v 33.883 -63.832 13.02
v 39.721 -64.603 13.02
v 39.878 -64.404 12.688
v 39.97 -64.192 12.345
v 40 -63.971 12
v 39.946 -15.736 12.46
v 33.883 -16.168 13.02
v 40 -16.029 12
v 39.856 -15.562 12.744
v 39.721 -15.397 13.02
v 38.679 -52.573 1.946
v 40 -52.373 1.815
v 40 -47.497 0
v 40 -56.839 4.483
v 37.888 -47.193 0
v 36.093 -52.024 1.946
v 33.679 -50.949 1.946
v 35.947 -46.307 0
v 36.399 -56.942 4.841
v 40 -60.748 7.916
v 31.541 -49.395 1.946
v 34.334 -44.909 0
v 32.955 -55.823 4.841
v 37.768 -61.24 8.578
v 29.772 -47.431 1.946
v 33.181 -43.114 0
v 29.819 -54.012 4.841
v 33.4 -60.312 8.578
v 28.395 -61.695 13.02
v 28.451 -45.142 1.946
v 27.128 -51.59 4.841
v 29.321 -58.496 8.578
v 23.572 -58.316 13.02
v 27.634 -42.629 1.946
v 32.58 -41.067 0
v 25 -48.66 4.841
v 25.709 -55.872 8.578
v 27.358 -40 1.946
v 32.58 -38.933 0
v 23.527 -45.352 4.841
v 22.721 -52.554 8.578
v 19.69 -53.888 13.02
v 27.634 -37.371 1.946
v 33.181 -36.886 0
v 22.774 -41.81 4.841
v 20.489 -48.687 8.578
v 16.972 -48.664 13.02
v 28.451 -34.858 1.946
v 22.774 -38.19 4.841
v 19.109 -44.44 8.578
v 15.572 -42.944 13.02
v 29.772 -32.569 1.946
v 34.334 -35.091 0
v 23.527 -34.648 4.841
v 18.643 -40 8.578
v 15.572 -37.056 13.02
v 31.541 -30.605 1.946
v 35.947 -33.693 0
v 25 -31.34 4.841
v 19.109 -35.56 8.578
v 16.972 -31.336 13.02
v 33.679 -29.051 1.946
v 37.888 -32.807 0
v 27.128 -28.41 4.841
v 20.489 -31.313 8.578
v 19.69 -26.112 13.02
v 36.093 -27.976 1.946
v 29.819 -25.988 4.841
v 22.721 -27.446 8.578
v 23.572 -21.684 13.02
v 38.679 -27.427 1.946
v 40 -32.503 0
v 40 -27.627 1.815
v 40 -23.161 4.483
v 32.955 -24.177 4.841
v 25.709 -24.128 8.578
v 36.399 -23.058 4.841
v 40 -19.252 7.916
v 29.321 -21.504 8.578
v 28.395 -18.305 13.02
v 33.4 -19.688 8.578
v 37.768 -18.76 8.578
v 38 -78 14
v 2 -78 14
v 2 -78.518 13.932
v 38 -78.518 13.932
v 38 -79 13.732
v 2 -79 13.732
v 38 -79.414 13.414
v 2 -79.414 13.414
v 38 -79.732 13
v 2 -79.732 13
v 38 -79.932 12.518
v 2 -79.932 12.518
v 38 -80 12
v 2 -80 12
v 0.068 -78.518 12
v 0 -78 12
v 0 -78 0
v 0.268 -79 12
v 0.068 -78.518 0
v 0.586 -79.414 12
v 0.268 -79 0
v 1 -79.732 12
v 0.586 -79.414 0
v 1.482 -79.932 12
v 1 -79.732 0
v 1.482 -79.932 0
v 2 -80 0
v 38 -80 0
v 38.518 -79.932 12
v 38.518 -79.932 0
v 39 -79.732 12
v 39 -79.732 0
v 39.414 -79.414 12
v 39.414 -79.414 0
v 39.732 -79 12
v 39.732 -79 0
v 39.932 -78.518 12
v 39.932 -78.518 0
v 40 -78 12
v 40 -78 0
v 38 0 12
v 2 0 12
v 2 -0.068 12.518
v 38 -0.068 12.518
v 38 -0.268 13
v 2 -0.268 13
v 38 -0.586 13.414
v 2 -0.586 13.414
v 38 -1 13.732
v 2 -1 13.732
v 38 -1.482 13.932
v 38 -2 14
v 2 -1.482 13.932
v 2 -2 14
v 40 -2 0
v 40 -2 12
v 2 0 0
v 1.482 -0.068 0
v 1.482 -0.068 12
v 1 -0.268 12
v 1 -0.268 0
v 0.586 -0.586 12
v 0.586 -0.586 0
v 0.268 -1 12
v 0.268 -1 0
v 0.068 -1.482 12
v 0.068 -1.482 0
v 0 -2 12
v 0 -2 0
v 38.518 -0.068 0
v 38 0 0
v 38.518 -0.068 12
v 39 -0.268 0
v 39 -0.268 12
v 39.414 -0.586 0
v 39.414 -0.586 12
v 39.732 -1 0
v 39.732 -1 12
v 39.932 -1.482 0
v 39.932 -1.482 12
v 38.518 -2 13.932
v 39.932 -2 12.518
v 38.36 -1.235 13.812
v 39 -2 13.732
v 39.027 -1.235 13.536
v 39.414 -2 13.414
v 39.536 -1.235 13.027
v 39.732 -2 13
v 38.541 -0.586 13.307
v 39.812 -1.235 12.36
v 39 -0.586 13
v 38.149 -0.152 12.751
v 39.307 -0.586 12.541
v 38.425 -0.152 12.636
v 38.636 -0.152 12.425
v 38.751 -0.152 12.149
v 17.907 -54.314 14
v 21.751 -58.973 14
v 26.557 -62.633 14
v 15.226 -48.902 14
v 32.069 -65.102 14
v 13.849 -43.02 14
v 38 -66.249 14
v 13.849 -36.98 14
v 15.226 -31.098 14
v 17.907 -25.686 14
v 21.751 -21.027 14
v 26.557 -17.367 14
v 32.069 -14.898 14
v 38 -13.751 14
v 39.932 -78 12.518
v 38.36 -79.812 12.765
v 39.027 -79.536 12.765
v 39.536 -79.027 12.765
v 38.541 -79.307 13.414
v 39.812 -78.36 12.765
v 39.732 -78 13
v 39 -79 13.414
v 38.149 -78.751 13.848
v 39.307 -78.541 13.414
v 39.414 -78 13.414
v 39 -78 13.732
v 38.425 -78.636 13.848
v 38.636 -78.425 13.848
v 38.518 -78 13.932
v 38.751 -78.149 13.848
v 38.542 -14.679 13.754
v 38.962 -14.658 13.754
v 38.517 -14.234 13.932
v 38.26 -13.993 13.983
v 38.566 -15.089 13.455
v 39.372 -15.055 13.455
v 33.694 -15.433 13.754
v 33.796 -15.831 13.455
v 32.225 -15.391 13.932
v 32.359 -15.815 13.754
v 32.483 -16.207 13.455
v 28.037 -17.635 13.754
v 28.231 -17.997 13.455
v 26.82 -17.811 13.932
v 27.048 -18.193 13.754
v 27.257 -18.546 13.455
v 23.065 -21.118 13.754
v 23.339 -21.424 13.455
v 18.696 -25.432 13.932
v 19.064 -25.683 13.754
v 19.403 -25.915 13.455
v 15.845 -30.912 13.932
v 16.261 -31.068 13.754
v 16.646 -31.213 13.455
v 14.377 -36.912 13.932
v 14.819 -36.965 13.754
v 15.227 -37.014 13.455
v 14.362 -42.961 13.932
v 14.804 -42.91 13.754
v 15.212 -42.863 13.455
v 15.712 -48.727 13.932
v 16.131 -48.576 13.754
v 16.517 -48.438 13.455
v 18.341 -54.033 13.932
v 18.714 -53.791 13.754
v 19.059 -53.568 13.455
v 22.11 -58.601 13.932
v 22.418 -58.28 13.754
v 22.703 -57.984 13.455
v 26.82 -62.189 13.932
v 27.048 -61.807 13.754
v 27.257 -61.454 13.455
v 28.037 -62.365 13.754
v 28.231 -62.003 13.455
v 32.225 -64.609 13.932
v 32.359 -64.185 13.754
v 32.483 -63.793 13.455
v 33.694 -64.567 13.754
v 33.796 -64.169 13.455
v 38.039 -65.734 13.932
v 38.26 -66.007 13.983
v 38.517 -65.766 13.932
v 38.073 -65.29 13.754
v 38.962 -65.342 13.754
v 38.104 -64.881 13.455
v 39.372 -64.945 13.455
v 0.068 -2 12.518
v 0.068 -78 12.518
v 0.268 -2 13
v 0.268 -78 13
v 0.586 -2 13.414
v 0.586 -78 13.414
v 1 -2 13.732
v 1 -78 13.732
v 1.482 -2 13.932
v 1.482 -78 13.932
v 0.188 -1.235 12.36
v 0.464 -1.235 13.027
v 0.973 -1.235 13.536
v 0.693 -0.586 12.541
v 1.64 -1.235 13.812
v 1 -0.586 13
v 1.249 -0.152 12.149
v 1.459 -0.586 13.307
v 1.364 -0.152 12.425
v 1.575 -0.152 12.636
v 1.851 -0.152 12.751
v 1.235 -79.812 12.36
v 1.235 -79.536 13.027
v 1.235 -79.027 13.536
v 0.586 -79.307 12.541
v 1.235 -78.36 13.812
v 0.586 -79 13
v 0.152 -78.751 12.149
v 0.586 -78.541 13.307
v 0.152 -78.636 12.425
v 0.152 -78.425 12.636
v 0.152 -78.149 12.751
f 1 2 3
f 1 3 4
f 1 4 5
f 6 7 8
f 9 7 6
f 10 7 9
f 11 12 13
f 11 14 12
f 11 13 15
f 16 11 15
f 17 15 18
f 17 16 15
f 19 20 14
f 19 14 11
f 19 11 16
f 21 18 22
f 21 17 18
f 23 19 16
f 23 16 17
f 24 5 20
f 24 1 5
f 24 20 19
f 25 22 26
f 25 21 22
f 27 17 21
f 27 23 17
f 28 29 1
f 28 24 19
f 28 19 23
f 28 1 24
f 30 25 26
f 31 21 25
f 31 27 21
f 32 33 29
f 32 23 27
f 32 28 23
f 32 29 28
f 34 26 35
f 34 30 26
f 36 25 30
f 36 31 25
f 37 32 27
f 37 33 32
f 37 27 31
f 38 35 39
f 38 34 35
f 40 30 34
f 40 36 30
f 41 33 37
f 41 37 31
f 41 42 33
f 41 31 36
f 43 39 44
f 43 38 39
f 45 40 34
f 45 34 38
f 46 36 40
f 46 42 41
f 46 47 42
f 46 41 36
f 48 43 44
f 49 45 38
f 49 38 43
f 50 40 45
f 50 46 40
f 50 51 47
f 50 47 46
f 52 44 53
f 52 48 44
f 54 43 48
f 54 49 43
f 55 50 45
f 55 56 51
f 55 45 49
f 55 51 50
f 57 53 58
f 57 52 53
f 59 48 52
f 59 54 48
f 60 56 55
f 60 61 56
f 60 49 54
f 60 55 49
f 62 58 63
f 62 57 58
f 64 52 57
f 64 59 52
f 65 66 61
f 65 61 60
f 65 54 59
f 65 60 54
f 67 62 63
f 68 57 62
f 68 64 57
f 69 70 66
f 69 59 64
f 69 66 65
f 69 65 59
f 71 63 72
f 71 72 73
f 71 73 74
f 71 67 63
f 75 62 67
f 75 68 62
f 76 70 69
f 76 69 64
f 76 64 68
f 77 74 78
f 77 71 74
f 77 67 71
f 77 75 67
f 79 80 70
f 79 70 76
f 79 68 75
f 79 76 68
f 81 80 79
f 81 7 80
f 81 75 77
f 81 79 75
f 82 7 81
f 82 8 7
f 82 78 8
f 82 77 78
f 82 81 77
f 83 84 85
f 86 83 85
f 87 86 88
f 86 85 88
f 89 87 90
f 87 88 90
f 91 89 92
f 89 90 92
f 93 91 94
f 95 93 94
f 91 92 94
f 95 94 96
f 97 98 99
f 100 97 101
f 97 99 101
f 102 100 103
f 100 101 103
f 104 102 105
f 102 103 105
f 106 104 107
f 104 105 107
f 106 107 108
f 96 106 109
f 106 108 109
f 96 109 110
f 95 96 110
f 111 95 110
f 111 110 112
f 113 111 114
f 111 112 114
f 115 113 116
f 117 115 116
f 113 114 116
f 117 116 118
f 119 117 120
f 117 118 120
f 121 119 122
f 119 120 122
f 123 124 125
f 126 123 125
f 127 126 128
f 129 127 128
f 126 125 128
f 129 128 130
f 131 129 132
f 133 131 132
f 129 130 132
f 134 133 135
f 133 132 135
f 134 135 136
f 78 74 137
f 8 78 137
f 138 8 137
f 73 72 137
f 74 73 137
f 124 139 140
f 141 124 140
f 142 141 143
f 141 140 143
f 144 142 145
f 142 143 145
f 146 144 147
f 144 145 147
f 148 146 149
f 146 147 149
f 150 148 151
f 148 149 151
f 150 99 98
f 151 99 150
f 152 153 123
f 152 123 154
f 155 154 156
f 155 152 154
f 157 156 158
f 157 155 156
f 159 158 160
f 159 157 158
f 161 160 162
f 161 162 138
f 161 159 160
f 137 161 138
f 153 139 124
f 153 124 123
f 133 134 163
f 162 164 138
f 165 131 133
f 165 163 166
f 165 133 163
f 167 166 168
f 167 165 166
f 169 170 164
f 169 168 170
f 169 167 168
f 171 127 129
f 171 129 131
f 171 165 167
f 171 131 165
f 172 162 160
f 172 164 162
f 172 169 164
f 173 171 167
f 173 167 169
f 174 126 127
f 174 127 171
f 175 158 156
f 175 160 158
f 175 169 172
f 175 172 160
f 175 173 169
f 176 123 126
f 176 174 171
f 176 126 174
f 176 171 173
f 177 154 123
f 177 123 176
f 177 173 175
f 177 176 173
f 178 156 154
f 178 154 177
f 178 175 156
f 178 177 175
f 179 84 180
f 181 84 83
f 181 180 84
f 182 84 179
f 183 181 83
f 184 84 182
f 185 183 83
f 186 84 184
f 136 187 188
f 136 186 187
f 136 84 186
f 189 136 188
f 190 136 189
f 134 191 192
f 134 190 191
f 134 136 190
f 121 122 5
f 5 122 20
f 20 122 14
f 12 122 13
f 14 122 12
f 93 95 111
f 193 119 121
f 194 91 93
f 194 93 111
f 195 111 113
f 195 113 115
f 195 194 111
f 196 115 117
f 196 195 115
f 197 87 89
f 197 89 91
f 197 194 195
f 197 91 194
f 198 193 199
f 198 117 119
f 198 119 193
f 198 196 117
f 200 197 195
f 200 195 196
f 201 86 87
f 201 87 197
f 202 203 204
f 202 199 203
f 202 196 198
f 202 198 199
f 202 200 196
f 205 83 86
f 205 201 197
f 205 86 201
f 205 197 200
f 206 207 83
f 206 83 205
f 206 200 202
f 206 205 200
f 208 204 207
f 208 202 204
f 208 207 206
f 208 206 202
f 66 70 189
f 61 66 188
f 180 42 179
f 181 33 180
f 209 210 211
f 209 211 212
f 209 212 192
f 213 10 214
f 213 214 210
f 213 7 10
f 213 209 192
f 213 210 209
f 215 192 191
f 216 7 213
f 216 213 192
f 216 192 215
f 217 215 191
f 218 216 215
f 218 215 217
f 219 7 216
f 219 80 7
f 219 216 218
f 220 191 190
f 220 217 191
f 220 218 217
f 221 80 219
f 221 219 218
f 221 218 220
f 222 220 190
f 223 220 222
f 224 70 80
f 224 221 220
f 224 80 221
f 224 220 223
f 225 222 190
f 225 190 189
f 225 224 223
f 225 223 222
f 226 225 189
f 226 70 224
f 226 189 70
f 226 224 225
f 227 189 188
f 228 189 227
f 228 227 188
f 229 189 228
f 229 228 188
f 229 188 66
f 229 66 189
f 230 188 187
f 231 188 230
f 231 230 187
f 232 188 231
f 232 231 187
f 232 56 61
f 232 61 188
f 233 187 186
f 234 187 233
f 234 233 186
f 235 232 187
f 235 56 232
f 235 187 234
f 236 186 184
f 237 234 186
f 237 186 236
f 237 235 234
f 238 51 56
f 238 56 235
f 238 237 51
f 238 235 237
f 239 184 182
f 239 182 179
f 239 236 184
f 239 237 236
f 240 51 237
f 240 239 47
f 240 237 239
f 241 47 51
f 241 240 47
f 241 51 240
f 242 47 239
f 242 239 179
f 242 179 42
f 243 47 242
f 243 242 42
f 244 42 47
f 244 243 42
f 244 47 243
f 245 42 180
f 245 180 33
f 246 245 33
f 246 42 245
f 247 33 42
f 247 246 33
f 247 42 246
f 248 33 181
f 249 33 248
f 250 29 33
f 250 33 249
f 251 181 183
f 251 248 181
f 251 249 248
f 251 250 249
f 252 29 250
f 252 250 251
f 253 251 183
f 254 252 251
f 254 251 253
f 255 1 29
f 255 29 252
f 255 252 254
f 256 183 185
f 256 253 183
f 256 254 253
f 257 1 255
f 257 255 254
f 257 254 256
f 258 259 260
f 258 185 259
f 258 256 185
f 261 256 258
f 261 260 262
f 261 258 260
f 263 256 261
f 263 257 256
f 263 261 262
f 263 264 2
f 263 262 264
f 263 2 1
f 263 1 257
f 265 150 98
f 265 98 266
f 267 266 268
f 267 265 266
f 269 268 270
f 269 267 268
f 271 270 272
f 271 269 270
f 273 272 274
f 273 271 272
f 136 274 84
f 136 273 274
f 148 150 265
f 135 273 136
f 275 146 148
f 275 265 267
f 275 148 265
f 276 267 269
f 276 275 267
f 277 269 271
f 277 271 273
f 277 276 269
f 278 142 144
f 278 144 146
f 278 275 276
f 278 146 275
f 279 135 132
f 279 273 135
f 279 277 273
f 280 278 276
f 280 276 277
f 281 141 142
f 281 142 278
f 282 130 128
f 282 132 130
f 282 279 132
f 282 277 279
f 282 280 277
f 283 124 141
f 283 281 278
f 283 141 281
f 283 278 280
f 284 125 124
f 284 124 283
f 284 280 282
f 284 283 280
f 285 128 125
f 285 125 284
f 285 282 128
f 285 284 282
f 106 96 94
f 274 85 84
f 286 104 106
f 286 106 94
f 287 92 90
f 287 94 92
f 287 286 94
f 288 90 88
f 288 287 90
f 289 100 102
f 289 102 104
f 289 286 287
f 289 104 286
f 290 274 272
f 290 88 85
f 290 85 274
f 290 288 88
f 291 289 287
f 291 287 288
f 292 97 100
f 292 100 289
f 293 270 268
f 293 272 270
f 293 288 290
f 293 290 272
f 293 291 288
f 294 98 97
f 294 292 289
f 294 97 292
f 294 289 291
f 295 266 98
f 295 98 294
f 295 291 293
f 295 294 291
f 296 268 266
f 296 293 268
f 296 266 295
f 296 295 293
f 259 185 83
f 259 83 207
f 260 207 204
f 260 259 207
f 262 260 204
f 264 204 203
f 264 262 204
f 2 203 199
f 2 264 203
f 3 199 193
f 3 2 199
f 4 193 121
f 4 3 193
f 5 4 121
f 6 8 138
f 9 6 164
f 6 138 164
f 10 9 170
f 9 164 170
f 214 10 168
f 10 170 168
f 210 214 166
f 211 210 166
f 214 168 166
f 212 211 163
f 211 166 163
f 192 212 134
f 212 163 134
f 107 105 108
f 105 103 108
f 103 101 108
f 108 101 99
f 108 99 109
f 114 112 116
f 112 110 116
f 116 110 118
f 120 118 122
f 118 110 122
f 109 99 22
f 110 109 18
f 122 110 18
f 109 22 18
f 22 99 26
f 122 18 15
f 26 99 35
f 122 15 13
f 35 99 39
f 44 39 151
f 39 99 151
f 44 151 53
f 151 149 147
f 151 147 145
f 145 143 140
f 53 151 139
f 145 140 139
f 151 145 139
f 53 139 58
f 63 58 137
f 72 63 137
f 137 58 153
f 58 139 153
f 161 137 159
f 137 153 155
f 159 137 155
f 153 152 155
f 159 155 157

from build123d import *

# Parameters (mm, degrees)
F0_W         = 40
F0_H         = 80
F1_DEPTH     = 14
F4_T1_DEPTH  = 17.8405087492
F4_T3_DEPTH  = 17.8405087492
F4_T5_DEPTH  = 36
F4_T7_DEPTH  = 76
F4_T9_DEPTH  = 17
F4_S13_W     = 2
F4_S13_H     = 2
F4_T14_DEPTH = 2
F4_S19_W     = 2
F4_S19_H     = 2
F4_T20_DEPTH = 2
F4_S25_W     = 2
F4_S25_H     = 2
F4_T26_DEPTH = 2
F4_S31_W     = 2
F4_S31_H     = 2
F4_T32_DEPTH = 2
F4_T36_ANGLE = 193.2912055484


# Not quite as in the source:
# - a fillet or chamfer that OpenCascade refuses, or shapes differently, is made with other operations: its cross-section is extruded or revolved along the edge and cut away or added


with BuildPart() as f1:
    # F0 (on Top) → F1 (new body)
    with BuildSketch(Plane.XY):
        with Locations((20, -40)):
            Rectangle(F0_W, F0_H)
    extrude(amount=F1_DEPTH)

    # F2 (on face) → F3 (revolve, cut)
    with BuildSketch(Plane.YZ.offset(40)):
        with BuildLine():
            Line((-40, 0), (-32.5033340744, 0))
            ThreePointArc((-32.5033340744, 0), (-22.2346925053, 5.186748348), (-14.8405087492, 14))
            Line((-14.8405087492, 14), (-40, 14))
            Line((-40, 14), (-40, 0))
        make_face()
        with BuildLine():
            Line((-40, 14), (-14.8405087492, 14))
            ThreePointArc((-14.8405087492, 14), (-15.4345771459, 42.2458185159), (-40, 56.2))
            Line((-40, 56.2), (-40, 14))
        make_face()
        with BuildLine():
            Line((-40, 0), (-40, -1))
            ThreePointArc((-40, -1), (-36.2184659198, -0.7488976858), (-32.5033340744, 0))
            Line((-32.5033340744, 0), (-40, 0))
        make_face()
    revolve(axis=Axis((40, -40, 27.6), (0, 0, -1)), mode=Mode.SUBTRACT)

    # F4: fillet of radius 2 on 10 edges, made by hand

    # F4_s2 → F4_t1 (cut)
    with BuildSketch(Plane.XZ.offset(2)):
        with BuildLine():
            ThreePointArc((40, 12), (39.4142135624, 13.4142135624), (38, 14))
            Line((38, 14), (40, 14))
            Line((40, 14), (40, 12))
        make_face()
    extrude(amount=F4_T1_DEPTH, mode=Mode.SUBTRACT)

    # F4_s4 → F4_t3 (cut)
    with BuildSketch(Plane.XZ.offset(60.1594912508)):
        with BuildLine():
            ThreePointArc((38, 14), (39.4142135624, 13.4142135624), (40, 12))
            Line((40, 12), (40, 14))
            Line((40, 14), (38, 14))
        make_face()
    extrude(amount=F4_T3_DEPTH, mode=Mode.SUBTRACT)

    # F4_s6 → F4_t5 (cut)
    with BuildSketch(Plane.YZ.offset(2)):
        with BuildLine():
            ThreePointArc((-78, 14), (-79.4142135624, 13.4142135624), (-80, 12))
            Line((-80, 12), (-80, 14))
            Line((-80, 14), (-78, 14))
        make_face()
        with BuildLine():
            ThreePointArc((0, 12), (-0.5857864376, 13.4142135624), (-2, 14))
            Line((-2, 14), (0, 14))
            Line((0, 14), (0, 12))
        make_face()
    extrude(amount=F4_T5_DEPTH, mode=Mode.SUBTRACT)

    # F4_s8 → F4_t7 (cut)
    with BuildSketch(Plane.XZ.offset(2)):
        with BuildLine():
            ThreePointArc((0, 12), (0.5857864376, 13.4142135624), (2, 14))
            Line((2, 14), (0, 14))
            Line((0, 14), (0, 12))
        make_face()
    extrude(amount=F4_T7_DEPTH, mode=Mode.SUBTRACT)

    # F4_s10 → F4_t9 (cut)
    with BuildSketch(Plane.XY.offset(-5)):
        with BuildLine():
            ThreePointArc((38, -80), (39.4142135624, -79.4142135624), (40, -78))
            Line((40, -78), (40, -80))
            Line((40, -80), (38, -80))
        make_face()
        with BuildLine():
            ThreePointArc((0, -78), (0.5857864376, -79.4142135624), (2, -80))
            Line((2, -80), (0, -80))
            Line((0, -80), (0, -78))
        make_face()
        with BuildLine():
            ThreePointArc((38, 0), (39.4142135624, -0.5857864376), (40, -2))
            Line((40, -2), (40, 0))
            Line((40, 0), (38, 0))
        make_face()
        with BuildLine():
            ThreePointArc((2, 0), (0.5857864376, -0.5857864376), (0, -2))
            Line((0, -2), (0, 0))
            Line((0, 0), (2, 0))
        make_face()
    extrude(amount=F4_T9_DEPTH, mode=Mode.SUBTRACT)


with BuildPart() as f4_tool12:
    # F4_s13 → F4_t14 (new body)
    with BuildSketch(Plane.XZ.offset(2)):
        with Locations((39, 13)):
            Rectangle(F4_S13_W, F4_S13_H)
    extrude(amount=-F4_T14_DEPTH)

    # F4_s15 → F4_t16 (revolve, cut)
    with BuildSketch(Plane(origin=(38, -2, 12), x_dir=(-0.7071067812, 0, -0.7071067812), z_dir=(0.7071067812, 0, -0.7071067812))):
        with BuildLine():
            ThreePointArc((0, -2), (2, 0), (0, 2))
            Line((0, 2), (0, -2))
        make_face()
    revolve(axis=Axis((38, -2, 12), (0, 1, 0)), mode=Mode.SUBTRACT)


with BuildPart() as f1_1:
    add(f1.part)

    # F4_t11: cut F4_tool12
    add(f4_tool12.part, mode=Mode.SUBTRACT)


with BuildPart() as f4_tool18:
    # F4_s19 → F4_t20 (new body)
    with BuildSketch(Plane.XY.offset(12)):
        with Locations((39, -79)):
            Rectangle(F4_S19_W, F4_S19_H)
    extrude(amount=F4_T20_DEPTH)

    # F4_s21 → F4_t22 (revolve, cut)
    with BuildSketch(Plane(origin=(38, -78, 12), x_dir=(-0.7071067812, 0.7071067812, 0), z_dir=(0.7071067812, 0.7071067812, 0))):
        with BuildLine():
            ThreePointArc((0, -2), (2, 0), (0, 2))
            Line((0, 2), (0, -2))
        make_face()
    revolve(axis=Axis((38, -78, 12), (0, 0, 1)), mode=Mode.SUBTRACT)


with BuildPart() as f1_2:
    add(f1_1.part)

    # F4_t17: cut F4_tool18
    add(f4_tool18.part, mode=Mode.SUBTRACT)


with BuildPart() as f4_tool24:
    # F4_s25 → F4_t26 (new body)
    with BuildSketch(Plane.YZ.offset(2)):
        with Locations((-79, 13)):
            Rectangle(F4_S25_W, F4_S25_H)
    extrude(amount=-F4_T26_DEPTH)

    # F4_s27 → F4_t28 (revolve, cut)
    with BuildSketch(Plane(origin=(2, -78, 12), x_dir=(0, 0.7071067812, -0.7071067812), z_dir=(0, 0.7071067812, 0.7071067812))):
        with BuildLine():
            ThreePointArc((0, -2), (2, 0), (0, 2))
            Line((0, 2), (0, -2))
        make_face()
    revolve(axis=Axis((2, -78, 12), (-1, 0, 0)), mode=Mode.SUBTRACT)


with BuildPart() as f1_3:
    add(f1_2.part)

    # F4_t23: cut F4_tool24
    add(f4_tool24.part, mode=Mode.SUBTRACT)


with BuildPart() as f4_tool30:
    # F4_s31 → F4_t32 (new body)
    with BuildSketch(Plane.XZ.offset(2)):
        with Locations((1, 13)):
            Rectangle(F4_S31_W, F4_S31_H)
    extrude(amount=-F4_T32_DEPTH)

    # F4_s33 → F4_t34 (revolve, cut)
    with BuildSketch(Plane(origin=(2, -2, 12), x_dir=(0.7071067812, 0, -0.7071067812), z_dir=(0.7071067812, 0, 0.7071067812))):
        with BuildLine():
            ThreePointArc((0, -2), (2, 0), (0, 2))
            Line((0, 2), (0, -2))
        make_face()
    revolve(axis=Axis((2, -2, 12), (0, 1, 0)), mode=Mode.SUBTRACT)


with BuildPart() as f1_4:
    add(f1_3.part)

    # F4_t29: cut F4_tool30
    add(f4_tool30.part, mode=Mode.SUBTRACT)

    # F4_s35 → F4_t36 (revolve, cut)
    with BuildSketch(Plane(origin=(44.0622906263, -5.1337237407, 0), x_dir=(0, 0, 1), z_dir=(0.9932809704, -0.1157277578, 0))):
        with BuildLine():
            ThreePointArc((14, 8.7772353391), (13.7377018856, 9.7673828821), (13.0196078431, 10.4978165916))
            ThreePointArc((13.0196078431, 10.4978165916), (13.5070698024, 10.2153987353), (14, 9.9426372505))
            Line((14, 9.9426372505), (14, 8.7772353391))
        make_face()
    revolve(axis=Axis((40, -40, 14), (0, 0, 1)), revolution_arc=F4_T36_ANGLE, mode=Mode.SUBTRACT)


solid = f1_4.part
